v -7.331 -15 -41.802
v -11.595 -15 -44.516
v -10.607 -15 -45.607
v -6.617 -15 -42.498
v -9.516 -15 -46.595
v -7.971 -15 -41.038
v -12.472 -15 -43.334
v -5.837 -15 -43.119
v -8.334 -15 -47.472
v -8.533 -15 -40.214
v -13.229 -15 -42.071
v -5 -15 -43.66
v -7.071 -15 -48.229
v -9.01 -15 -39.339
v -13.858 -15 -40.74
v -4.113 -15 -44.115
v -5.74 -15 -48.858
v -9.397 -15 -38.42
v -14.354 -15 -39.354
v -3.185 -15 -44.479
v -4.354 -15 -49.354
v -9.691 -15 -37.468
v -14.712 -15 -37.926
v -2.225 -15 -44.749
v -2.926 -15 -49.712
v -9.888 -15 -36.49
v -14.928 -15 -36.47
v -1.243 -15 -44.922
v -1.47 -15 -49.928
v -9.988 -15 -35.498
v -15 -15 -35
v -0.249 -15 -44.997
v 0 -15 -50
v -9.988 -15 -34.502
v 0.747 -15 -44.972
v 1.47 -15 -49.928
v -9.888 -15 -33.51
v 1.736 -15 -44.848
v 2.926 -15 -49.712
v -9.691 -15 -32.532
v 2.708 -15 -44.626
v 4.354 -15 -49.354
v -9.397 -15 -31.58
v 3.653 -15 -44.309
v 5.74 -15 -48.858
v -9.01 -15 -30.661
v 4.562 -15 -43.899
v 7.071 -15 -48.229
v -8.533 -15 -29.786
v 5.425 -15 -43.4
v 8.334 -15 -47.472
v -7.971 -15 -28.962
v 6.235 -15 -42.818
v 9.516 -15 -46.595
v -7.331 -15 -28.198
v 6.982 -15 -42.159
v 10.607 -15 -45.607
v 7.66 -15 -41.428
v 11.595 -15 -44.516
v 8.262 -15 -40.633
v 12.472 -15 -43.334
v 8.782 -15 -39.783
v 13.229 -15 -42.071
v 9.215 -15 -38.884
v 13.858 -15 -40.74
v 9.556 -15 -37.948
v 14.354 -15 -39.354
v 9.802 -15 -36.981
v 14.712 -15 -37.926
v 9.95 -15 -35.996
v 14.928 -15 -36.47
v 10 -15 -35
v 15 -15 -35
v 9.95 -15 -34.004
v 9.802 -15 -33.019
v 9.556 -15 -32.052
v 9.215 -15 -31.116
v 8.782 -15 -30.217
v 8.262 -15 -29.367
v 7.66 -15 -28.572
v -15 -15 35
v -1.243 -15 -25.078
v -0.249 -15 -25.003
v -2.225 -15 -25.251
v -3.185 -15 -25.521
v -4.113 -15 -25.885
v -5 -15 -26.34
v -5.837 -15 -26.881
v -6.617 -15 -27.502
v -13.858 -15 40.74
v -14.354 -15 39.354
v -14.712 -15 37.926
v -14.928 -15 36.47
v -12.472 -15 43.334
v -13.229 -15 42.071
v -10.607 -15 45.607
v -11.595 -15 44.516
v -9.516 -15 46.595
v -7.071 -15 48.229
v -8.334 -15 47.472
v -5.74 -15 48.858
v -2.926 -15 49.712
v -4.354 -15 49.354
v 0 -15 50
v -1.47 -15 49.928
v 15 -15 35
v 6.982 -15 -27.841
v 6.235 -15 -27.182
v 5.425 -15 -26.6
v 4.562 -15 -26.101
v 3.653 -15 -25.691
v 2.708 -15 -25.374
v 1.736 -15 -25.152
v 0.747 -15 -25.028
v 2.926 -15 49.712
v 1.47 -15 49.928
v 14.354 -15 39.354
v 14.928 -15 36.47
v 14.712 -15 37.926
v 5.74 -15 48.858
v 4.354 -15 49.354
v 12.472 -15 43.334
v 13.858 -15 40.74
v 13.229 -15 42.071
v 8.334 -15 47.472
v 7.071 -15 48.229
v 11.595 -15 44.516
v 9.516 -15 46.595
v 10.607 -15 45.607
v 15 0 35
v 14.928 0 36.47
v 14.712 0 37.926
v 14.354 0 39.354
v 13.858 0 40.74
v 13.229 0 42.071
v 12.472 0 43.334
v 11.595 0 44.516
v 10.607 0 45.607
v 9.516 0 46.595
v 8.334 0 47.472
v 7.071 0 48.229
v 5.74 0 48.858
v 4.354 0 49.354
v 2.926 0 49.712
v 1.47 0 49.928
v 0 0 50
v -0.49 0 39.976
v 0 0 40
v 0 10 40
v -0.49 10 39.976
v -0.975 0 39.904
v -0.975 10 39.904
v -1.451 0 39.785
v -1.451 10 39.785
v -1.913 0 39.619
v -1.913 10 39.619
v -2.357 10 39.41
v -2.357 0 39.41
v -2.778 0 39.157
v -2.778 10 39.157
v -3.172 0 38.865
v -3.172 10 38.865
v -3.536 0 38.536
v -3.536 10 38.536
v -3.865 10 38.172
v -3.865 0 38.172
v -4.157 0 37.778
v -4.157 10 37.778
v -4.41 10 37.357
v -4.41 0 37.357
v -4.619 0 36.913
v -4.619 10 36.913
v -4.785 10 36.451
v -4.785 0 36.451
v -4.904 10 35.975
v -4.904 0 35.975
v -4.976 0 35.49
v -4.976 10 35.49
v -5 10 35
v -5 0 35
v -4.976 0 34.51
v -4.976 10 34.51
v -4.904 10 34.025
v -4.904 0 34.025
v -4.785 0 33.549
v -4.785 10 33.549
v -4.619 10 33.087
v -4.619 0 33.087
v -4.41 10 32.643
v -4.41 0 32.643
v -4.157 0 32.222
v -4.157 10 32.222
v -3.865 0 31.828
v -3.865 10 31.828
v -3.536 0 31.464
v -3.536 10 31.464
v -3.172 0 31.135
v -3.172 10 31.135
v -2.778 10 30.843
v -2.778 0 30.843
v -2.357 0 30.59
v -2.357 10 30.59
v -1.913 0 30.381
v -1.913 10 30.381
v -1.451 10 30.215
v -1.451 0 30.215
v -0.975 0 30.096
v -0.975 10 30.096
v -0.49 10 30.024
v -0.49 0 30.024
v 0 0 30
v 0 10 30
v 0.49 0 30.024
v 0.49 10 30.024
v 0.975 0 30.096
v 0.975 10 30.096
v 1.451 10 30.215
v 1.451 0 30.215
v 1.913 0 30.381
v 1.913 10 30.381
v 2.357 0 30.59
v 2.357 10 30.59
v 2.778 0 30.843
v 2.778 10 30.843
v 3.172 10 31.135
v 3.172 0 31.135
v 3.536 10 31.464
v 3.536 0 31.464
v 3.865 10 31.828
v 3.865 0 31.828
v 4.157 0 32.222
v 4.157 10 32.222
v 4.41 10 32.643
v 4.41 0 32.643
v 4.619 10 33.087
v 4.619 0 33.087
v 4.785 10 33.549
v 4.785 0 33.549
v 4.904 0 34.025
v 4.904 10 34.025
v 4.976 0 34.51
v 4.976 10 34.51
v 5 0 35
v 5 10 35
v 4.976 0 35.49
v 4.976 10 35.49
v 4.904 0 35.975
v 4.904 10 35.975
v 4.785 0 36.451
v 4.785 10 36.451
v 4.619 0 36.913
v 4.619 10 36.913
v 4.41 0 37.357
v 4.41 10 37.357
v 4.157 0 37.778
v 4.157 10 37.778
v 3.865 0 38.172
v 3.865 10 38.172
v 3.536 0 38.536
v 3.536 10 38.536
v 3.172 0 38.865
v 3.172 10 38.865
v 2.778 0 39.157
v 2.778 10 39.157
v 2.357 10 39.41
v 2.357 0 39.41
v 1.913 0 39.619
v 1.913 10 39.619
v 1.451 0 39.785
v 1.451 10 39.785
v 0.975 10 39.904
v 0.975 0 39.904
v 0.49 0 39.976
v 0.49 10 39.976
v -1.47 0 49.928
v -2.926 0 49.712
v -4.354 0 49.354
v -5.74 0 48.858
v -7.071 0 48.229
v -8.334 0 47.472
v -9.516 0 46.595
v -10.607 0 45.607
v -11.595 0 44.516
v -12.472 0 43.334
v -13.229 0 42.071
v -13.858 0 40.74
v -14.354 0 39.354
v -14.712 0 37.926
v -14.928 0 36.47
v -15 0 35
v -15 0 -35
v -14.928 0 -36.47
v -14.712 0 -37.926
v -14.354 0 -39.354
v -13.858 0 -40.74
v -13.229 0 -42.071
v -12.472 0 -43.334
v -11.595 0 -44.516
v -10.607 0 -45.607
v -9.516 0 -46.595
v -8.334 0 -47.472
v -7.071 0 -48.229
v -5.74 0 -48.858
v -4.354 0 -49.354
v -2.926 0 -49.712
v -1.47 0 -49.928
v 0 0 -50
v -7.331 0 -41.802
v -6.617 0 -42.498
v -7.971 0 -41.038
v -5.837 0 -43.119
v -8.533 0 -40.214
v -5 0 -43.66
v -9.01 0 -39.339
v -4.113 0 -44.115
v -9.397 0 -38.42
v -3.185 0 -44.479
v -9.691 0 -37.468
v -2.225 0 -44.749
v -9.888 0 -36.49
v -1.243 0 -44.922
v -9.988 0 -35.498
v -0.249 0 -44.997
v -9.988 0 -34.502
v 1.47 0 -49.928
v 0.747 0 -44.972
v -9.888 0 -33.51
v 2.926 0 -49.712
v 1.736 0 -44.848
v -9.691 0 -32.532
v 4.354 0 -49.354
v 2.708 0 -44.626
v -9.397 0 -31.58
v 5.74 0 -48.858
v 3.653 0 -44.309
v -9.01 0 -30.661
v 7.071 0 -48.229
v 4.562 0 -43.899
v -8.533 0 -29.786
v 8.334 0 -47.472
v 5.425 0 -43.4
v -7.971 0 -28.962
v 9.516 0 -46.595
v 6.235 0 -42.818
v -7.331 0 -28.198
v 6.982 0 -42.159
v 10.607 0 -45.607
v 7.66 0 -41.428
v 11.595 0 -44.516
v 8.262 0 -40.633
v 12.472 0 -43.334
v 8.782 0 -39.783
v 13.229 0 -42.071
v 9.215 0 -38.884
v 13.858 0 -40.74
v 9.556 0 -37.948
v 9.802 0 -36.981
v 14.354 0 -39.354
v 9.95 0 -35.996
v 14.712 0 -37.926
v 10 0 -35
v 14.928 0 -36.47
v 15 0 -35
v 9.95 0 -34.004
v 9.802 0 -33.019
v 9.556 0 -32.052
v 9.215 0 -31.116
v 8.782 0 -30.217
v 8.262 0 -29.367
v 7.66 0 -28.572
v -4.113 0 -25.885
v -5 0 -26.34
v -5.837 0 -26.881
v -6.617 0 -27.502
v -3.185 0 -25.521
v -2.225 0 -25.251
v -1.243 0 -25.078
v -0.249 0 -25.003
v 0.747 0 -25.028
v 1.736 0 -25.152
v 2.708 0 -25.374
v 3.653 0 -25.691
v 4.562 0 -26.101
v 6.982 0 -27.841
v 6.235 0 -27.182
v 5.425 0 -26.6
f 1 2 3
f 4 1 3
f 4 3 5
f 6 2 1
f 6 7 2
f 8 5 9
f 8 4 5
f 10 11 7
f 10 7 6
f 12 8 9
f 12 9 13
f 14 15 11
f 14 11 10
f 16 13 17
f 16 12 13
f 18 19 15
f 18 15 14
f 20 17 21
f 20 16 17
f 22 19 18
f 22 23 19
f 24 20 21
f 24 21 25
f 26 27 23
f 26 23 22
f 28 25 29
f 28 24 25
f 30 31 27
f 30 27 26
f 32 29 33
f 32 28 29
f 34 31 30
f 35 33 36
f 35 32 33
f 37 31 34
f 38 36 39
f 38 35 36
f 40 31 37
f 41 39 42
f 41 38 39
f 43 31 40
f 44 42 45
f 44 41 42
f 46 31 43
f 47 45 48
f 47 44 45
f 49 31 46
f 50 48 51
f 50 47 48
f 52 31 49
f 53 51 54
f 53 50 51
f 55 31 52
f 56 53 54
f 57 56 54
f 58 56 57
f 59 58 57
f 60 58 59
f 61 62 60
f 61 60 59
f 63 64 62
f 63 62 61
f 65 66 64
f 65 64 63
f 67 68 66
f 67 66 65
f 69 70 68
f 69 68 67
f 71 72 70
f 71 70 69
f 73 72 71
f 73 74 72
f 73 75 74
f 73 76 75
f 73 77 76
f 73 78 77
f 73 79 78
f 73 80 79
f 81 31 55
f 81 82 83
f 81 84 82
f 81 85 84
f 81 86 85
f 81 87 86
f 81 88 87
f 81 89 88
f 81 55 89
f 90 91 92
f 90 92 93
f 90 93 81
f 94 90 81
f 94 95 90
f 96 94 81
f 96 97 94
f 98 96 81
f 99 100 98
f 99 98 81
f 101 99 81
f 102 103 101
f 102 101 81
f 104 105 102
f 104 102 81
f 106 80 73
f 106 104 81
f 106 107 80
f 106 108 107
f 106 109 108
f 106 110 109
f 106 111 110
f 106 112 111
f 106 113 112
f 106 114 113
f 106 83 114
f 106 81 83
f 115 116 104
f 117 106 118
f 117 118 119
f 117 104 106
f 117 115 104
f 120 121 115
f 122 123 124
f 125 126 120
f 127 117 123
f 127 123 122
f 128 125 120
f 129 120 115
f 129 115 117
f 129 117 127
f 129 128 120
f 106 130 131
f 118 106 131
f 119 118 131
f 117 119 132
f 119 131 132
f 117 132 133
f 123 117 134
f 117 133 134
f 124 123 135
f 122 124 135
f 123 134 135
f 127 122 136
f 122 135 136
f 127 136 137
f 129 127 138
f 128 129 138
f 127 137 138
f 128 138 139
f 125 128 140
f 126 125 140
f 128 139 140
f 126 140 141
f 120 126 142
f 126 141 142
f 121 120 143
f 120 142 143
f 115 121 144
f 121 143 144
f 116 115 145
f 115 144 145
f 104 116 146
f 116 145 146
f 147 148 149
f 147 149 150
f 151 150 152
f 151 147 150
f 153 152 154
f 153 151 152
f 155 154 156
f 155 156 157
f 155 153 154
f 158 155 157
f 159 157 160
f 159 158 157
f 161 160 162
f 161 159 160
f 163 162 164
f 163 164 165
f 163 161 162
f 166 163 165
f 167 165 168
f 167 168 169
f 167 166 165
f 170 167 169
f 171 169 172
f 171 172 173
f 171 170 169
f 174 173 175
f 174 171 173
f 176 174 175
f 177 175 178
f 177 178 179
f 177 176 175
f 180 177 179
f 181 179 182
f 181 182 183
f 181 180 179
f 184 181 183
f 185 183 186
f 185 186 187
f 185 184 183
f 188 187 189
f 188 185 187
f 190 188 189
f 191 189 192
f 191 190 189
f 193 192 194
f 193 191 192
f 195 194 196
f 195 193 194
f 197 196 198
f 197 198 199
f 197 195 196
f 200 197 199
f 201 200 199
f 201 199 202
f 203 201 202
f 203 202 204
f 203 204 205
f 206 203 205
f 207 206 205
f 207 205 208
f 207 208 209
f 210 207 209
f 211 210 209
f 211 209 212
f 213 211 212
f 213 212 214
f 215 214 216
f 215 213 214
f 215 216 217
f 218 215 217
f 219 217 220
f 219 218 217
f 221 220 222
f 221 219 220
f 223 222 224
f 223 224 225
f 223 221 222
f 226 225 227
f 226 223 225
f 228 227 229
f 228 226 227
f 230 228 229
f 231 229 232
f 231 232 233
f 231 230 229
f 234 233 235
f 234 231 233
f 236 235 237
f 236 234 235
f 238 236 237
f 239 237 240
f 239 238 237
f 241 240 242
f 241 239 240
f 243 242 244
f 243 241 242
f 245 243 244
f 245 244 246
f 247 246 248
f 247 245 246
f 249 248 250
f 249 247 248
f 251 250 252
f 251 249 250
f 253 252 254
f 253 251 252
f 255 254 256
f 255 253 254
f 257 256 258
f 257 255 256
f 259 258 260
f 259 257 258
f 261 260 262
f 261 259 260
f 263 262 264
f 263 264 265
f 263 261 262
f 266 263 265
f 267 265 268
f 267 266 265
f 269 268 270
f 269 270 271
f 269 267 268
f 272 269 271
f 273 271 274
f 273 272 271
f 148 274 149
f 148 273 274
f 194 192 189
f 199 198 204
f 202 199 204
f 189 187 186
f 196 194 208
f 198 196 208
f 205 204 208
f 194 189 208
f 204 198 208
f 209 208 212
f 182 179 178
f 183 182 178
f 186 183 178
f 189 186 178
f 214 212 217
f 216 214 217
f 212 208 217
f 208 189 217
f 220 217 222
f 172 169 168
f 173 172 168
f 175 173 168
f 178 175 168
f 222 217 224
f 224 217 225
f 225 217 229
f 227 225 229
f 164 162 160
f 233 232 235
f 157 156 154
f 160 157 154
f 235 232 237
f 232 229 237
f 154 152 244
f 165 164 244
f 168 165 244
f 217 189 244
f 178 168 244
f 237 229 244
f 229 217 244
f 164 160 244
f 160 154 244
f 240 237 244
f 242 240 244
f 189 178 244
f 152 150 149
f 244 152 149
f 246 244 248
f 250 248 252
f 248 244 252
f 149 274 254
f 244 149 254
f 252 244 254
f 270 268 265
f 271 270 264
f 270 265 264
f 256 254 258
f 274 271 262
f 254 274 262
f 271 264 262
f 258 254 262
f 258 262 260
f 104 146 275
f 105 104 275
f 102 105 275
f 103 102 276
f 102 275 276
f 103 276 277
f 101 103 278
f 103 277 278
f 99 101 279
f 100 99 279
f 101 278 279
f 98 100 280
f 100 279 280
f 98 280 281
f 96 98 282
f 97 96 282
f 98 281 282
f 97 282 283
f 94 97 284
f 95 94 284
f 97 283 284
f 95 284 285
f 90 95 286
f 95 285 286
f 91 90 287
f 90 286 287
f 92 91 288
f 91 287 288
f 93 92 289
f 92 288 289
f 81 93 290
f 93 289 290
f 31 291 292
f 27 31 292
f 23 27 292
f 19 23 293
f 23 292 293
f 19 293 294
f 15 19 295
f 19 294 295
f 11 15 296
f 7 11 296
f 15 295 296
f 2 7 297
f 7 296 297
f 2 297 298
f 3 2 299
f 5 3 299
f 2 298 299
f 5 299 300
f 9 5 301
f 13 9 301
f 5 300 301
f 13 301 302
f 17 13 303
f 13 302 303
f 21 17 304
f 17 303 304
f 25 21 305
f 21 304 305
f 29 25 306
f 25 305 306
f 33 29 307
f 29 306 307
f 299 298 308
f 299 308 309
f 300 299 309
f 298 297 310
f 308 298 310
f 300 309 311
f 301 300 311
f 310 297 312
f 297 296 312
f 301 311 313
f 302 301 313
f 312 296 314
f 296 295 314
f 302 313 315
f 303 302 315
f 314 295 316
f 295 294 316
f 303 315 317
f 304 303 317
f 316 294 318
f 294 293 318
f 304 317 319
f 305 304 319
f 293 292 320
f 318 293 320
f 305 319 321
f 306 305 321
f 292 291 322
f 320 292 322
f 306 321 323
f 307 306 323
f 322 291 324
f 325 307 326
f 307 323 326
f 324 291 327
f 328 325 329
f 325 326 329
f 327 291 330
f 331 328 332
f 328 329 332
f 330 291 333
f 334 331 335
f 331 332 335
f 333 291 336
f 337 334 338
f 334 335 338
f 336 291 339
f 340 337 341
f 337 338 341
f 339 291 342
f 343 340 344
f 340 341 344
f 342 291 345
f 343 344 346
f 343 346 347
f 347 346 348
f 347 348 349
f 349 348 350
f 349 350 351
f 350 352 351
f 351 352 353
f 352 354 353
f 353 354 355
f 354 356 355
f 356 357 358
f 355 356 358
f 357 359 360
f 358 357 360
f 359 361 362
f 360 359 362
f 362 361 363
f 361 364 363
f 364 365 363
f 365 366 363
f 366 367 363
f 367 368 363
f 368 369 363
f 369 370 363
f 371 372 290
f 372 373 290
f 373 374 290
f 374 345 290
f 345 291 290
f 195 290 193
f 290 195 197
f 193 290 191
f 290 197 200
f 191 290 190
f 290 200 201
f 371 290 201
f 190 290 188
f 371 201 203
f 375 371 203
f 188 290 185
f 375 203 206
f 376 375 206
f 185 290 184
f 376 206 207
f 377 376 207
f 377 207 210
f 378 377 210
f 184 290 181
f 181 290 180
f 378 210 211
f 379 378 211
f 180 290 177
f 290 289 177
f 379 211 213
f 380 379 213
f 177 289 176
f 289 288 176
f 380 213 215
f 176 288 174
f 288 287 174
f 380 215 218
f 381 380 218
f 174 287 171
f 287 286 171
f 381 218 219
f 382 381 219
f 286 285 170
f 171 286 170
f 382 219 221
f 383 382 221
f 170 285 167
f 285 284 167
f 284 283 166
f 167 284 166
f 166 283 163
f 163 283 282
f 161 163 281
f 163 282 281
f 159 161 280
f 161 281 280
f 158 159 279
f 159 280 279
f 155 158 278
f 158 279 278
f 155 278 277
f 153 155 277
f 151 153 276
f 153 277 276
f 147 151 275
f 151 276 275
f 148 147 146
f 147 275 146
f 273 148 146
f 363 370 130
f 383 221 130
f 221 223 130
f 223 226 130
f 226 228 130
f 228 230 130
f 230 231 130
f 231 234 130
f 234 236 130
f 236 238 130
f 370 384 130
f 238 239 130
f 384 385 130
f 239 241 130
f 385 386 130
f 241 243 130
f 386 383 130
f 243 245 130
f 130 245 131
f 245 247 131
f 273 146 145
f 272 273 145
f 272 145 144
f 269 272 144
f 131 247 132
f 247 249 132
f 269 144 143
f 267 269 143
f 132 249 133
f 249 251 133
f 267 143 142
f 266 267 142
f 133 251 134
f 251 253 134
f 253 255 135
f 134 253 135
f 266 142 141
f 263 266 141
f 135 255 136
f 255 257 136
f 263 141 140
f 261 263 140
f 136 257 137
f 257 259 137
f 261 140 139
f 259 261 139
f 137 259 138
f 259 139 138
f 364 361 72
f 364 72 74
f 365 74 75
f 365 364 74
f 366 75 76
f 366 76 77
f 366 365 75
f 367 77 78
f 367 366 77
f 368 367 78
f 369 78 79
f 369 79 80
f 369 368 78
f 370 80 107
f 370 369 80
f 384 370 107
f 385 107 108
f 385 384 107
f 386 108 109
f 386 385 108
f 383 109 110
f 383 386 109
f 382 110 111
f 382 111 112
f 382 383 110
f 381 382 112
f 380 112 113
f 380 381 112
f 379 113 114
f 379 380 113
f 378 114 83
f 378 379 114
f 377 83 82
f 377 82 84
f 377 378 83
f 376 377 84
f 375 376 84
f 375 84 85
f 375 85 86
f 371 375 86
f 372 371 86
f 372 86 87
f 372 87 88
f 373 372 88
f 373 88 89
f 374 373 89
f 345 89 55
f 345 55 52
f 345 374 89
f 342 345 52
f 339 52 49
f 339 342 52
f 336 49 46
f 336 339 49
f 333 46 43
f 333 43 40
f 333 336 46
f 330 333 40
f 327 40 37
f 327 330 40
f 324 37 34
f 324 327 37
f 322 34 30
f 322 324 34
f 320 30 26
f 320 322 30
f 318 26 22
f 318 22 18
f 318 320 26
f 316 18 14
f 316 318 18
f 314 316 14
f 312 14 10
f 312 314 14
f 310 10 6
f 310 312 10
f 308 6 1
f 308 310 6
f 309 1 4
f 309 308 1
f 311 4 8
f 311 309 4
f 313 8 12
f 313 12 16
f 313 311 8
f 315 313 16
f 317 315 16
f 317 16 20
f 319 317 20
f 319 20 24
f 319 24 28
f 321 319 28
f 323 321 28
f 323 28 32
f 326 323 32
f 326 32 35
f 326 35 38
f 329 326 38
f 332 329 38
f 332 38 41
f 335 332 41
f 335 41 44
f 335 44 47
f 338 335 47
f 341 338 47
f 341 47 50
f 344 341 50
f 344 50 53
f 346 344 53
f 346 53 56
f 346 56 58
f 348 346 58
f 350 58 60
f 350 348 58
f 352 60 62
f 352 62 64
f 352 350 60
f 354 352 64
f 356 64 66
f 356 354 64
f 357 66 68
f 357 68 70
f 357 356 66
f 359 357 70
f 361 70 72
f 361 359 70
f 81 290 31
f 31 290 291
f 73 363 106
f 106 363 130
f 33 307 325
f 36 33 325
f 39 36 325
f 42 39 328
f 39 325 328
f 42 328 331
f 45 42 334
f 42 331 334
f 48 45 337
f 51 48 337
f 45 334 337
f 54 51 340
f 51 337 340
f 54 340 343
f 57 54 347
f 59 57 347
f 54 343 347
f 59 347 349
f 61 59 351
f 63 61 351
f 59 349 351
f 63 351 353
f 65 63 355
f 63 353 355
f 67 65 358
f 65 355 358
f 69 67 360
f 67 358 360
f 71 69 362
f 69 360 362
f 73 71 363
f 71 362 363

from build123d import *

# Parameters (mm, degrees)
F0_R     = 10
F1_DEPTH = 15
F3_DEPTH = 10


with BuildPart() as f1:
    # F0 (on Front) → F1 (new body)
    with BuildSketch(Plane.XZ):
        with BuildLine():
            ThreePointArc((0, -50), (10.606602, -45.606602), (15, -35))
            Line((15, -35), (15, 35))
            ThreePointArc((15, 35), (10.606602, 45.606602), (0, 50))
            ThreePointArc((0, 50), (-10.606602, 45.606602), (-15, 35))
            Line((-15, 35), (-15, -35))
            ThreePointArc((-15, -35), (-10.606602, -45.606602), (0, -50))
        make_face()
        with Locations((0, -35)):
            Circle(F0_R, mode=Mode.SUBTRACT)
    extrude(amount=F1_DEPTH)

    # F2 (on Front) → F3 (join)
    with BuildSketch(Plane.XZ):
        with BuildLine():
            ThreePointArc((0, 40), (-3.535534, 31.464466), (5, 35))
            ThreePointArc((5, 35), (3.535534, 38.535534), (0, 40))
        make_face()
    extrude(amount=-F3_DEPTH)


solid = f1.part
